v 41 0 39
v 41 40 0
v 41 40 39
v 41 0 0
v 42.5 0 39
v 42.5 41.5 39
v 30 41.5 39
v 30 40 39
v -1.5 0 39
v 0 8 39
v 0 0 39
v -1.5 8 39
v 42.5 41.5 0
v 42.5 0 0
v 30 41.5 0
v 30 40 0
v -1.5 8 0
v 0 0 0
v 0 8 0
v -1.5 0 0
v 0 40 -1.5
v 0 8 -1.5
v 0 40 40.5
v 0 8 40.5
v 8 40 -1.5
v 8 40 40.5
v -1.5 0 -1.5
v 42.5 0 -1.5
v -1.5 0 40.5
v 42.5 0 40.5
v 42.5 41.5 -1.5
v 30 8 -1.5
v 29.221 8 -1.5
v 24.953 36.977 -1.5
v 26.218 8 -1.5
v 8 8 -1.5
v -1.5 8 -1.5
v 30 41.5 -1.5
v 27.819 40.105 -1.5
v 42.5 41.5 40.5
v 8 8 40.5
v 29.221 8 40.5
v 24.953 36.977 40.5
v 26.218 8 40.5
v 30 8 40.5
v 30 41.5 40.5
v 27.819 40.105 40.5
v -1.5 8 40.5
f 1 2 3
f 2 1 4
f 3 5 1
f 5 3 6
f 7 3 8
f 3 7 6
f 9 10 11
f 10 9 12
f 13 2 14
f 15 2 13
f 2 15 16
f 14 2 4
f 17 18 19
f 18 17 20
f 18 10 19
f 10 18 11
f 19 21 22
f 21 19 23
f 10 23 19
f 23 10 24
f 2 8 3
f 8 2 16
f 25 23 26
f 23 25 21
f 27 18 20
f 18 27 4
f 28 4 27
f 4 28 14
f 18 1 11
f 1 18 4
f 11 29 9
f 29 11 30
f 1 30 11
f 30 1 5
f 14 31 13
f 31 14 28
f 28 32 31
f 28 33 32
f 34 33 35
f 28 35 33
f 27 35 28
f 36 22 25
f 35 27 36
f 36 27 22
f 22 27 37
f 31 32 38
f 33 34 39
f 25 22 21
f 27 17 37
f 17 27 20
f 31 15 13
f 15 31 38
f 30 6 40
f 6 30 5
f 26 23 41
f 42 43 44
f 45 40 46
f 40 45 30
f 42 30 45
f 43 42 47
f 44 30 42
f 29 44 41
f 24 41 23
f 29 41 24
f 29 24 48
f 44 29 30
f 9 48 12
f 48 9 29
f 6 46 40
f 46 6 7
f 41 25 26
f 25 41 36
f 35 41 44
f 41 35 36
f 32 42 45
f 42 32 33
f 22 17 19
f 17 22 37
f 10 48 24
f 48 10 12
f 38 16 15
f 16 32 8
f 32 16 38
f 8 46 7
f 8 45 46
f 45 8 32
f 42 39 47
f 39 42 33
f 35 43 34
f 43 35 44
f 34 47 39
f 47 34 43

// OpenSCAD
// outer size of adapter, units in mm
depth = 39;
width = 41;
height = 40;
// the wall we attach it to
inner = 18;
// distance from rear of the adapter to rear of the wall
strength = 8;
// notch, prevents supportless building
notch = 5;
nd = 2;
// clamp
tw = 3;
teeth = depth+2*tw;
// angle of the clamp ~ holding strength
clamp = 2.5;
// rims, prevent slipping of the kura holders
rim = 1.5;

// technical parameters
crop = 0.1; c = crop;

toff = (depth-teeth)/2;
front = width-inner-strength;
// main clamp with rims

difference() {
  union() {
    // this notch prevents building without support 
    //translate([0,-nd,-rim])
    //  cube([notch,nd+c,depth+2*rim]);
    
    cube([width, height, depth]);
    //rims    
    translate([-rim,0,-rim]) 
      cube([width+2*rim, height+rim, rim]);
    translate([-rim,0,depth]) 
      cube([width+2*rim, height+rim, rim]);
  }      
  translate([strength, strength, -crop-rim])
    cube([inner, height-strength+rim+c, depth+rim*2+c*2]);
  // clip rims
  translate([-rim-c,strength,-rim-c])
    cube([rim+c, height, depth+2*rim+2*c]);
  translate([-c,height,-c-rim])
    cube([strength+2*c,rim+c,depth+2*rim+2*c]);
  // hollow space for clamping teeth
  translate([inner,strength,toff])
    cube([front+toff, height, teeth]);

}

// clamping teeth
translate([0,strength,toff]) {
  th = height-strength+tw;
    translate([inner+strength,-tw,tw/2]) 
    translate([0,strength,0])
    rotate([0,0,clamp])
    translate([0,-strength,0])
    difference(){
      cube([tw, th, teeth-tw]);
      translate([0,th-tw,-c])
      rotate([0,0,45])   
      cube([tw*2, tw, teeth-tw+c*2]);   
    }
}
